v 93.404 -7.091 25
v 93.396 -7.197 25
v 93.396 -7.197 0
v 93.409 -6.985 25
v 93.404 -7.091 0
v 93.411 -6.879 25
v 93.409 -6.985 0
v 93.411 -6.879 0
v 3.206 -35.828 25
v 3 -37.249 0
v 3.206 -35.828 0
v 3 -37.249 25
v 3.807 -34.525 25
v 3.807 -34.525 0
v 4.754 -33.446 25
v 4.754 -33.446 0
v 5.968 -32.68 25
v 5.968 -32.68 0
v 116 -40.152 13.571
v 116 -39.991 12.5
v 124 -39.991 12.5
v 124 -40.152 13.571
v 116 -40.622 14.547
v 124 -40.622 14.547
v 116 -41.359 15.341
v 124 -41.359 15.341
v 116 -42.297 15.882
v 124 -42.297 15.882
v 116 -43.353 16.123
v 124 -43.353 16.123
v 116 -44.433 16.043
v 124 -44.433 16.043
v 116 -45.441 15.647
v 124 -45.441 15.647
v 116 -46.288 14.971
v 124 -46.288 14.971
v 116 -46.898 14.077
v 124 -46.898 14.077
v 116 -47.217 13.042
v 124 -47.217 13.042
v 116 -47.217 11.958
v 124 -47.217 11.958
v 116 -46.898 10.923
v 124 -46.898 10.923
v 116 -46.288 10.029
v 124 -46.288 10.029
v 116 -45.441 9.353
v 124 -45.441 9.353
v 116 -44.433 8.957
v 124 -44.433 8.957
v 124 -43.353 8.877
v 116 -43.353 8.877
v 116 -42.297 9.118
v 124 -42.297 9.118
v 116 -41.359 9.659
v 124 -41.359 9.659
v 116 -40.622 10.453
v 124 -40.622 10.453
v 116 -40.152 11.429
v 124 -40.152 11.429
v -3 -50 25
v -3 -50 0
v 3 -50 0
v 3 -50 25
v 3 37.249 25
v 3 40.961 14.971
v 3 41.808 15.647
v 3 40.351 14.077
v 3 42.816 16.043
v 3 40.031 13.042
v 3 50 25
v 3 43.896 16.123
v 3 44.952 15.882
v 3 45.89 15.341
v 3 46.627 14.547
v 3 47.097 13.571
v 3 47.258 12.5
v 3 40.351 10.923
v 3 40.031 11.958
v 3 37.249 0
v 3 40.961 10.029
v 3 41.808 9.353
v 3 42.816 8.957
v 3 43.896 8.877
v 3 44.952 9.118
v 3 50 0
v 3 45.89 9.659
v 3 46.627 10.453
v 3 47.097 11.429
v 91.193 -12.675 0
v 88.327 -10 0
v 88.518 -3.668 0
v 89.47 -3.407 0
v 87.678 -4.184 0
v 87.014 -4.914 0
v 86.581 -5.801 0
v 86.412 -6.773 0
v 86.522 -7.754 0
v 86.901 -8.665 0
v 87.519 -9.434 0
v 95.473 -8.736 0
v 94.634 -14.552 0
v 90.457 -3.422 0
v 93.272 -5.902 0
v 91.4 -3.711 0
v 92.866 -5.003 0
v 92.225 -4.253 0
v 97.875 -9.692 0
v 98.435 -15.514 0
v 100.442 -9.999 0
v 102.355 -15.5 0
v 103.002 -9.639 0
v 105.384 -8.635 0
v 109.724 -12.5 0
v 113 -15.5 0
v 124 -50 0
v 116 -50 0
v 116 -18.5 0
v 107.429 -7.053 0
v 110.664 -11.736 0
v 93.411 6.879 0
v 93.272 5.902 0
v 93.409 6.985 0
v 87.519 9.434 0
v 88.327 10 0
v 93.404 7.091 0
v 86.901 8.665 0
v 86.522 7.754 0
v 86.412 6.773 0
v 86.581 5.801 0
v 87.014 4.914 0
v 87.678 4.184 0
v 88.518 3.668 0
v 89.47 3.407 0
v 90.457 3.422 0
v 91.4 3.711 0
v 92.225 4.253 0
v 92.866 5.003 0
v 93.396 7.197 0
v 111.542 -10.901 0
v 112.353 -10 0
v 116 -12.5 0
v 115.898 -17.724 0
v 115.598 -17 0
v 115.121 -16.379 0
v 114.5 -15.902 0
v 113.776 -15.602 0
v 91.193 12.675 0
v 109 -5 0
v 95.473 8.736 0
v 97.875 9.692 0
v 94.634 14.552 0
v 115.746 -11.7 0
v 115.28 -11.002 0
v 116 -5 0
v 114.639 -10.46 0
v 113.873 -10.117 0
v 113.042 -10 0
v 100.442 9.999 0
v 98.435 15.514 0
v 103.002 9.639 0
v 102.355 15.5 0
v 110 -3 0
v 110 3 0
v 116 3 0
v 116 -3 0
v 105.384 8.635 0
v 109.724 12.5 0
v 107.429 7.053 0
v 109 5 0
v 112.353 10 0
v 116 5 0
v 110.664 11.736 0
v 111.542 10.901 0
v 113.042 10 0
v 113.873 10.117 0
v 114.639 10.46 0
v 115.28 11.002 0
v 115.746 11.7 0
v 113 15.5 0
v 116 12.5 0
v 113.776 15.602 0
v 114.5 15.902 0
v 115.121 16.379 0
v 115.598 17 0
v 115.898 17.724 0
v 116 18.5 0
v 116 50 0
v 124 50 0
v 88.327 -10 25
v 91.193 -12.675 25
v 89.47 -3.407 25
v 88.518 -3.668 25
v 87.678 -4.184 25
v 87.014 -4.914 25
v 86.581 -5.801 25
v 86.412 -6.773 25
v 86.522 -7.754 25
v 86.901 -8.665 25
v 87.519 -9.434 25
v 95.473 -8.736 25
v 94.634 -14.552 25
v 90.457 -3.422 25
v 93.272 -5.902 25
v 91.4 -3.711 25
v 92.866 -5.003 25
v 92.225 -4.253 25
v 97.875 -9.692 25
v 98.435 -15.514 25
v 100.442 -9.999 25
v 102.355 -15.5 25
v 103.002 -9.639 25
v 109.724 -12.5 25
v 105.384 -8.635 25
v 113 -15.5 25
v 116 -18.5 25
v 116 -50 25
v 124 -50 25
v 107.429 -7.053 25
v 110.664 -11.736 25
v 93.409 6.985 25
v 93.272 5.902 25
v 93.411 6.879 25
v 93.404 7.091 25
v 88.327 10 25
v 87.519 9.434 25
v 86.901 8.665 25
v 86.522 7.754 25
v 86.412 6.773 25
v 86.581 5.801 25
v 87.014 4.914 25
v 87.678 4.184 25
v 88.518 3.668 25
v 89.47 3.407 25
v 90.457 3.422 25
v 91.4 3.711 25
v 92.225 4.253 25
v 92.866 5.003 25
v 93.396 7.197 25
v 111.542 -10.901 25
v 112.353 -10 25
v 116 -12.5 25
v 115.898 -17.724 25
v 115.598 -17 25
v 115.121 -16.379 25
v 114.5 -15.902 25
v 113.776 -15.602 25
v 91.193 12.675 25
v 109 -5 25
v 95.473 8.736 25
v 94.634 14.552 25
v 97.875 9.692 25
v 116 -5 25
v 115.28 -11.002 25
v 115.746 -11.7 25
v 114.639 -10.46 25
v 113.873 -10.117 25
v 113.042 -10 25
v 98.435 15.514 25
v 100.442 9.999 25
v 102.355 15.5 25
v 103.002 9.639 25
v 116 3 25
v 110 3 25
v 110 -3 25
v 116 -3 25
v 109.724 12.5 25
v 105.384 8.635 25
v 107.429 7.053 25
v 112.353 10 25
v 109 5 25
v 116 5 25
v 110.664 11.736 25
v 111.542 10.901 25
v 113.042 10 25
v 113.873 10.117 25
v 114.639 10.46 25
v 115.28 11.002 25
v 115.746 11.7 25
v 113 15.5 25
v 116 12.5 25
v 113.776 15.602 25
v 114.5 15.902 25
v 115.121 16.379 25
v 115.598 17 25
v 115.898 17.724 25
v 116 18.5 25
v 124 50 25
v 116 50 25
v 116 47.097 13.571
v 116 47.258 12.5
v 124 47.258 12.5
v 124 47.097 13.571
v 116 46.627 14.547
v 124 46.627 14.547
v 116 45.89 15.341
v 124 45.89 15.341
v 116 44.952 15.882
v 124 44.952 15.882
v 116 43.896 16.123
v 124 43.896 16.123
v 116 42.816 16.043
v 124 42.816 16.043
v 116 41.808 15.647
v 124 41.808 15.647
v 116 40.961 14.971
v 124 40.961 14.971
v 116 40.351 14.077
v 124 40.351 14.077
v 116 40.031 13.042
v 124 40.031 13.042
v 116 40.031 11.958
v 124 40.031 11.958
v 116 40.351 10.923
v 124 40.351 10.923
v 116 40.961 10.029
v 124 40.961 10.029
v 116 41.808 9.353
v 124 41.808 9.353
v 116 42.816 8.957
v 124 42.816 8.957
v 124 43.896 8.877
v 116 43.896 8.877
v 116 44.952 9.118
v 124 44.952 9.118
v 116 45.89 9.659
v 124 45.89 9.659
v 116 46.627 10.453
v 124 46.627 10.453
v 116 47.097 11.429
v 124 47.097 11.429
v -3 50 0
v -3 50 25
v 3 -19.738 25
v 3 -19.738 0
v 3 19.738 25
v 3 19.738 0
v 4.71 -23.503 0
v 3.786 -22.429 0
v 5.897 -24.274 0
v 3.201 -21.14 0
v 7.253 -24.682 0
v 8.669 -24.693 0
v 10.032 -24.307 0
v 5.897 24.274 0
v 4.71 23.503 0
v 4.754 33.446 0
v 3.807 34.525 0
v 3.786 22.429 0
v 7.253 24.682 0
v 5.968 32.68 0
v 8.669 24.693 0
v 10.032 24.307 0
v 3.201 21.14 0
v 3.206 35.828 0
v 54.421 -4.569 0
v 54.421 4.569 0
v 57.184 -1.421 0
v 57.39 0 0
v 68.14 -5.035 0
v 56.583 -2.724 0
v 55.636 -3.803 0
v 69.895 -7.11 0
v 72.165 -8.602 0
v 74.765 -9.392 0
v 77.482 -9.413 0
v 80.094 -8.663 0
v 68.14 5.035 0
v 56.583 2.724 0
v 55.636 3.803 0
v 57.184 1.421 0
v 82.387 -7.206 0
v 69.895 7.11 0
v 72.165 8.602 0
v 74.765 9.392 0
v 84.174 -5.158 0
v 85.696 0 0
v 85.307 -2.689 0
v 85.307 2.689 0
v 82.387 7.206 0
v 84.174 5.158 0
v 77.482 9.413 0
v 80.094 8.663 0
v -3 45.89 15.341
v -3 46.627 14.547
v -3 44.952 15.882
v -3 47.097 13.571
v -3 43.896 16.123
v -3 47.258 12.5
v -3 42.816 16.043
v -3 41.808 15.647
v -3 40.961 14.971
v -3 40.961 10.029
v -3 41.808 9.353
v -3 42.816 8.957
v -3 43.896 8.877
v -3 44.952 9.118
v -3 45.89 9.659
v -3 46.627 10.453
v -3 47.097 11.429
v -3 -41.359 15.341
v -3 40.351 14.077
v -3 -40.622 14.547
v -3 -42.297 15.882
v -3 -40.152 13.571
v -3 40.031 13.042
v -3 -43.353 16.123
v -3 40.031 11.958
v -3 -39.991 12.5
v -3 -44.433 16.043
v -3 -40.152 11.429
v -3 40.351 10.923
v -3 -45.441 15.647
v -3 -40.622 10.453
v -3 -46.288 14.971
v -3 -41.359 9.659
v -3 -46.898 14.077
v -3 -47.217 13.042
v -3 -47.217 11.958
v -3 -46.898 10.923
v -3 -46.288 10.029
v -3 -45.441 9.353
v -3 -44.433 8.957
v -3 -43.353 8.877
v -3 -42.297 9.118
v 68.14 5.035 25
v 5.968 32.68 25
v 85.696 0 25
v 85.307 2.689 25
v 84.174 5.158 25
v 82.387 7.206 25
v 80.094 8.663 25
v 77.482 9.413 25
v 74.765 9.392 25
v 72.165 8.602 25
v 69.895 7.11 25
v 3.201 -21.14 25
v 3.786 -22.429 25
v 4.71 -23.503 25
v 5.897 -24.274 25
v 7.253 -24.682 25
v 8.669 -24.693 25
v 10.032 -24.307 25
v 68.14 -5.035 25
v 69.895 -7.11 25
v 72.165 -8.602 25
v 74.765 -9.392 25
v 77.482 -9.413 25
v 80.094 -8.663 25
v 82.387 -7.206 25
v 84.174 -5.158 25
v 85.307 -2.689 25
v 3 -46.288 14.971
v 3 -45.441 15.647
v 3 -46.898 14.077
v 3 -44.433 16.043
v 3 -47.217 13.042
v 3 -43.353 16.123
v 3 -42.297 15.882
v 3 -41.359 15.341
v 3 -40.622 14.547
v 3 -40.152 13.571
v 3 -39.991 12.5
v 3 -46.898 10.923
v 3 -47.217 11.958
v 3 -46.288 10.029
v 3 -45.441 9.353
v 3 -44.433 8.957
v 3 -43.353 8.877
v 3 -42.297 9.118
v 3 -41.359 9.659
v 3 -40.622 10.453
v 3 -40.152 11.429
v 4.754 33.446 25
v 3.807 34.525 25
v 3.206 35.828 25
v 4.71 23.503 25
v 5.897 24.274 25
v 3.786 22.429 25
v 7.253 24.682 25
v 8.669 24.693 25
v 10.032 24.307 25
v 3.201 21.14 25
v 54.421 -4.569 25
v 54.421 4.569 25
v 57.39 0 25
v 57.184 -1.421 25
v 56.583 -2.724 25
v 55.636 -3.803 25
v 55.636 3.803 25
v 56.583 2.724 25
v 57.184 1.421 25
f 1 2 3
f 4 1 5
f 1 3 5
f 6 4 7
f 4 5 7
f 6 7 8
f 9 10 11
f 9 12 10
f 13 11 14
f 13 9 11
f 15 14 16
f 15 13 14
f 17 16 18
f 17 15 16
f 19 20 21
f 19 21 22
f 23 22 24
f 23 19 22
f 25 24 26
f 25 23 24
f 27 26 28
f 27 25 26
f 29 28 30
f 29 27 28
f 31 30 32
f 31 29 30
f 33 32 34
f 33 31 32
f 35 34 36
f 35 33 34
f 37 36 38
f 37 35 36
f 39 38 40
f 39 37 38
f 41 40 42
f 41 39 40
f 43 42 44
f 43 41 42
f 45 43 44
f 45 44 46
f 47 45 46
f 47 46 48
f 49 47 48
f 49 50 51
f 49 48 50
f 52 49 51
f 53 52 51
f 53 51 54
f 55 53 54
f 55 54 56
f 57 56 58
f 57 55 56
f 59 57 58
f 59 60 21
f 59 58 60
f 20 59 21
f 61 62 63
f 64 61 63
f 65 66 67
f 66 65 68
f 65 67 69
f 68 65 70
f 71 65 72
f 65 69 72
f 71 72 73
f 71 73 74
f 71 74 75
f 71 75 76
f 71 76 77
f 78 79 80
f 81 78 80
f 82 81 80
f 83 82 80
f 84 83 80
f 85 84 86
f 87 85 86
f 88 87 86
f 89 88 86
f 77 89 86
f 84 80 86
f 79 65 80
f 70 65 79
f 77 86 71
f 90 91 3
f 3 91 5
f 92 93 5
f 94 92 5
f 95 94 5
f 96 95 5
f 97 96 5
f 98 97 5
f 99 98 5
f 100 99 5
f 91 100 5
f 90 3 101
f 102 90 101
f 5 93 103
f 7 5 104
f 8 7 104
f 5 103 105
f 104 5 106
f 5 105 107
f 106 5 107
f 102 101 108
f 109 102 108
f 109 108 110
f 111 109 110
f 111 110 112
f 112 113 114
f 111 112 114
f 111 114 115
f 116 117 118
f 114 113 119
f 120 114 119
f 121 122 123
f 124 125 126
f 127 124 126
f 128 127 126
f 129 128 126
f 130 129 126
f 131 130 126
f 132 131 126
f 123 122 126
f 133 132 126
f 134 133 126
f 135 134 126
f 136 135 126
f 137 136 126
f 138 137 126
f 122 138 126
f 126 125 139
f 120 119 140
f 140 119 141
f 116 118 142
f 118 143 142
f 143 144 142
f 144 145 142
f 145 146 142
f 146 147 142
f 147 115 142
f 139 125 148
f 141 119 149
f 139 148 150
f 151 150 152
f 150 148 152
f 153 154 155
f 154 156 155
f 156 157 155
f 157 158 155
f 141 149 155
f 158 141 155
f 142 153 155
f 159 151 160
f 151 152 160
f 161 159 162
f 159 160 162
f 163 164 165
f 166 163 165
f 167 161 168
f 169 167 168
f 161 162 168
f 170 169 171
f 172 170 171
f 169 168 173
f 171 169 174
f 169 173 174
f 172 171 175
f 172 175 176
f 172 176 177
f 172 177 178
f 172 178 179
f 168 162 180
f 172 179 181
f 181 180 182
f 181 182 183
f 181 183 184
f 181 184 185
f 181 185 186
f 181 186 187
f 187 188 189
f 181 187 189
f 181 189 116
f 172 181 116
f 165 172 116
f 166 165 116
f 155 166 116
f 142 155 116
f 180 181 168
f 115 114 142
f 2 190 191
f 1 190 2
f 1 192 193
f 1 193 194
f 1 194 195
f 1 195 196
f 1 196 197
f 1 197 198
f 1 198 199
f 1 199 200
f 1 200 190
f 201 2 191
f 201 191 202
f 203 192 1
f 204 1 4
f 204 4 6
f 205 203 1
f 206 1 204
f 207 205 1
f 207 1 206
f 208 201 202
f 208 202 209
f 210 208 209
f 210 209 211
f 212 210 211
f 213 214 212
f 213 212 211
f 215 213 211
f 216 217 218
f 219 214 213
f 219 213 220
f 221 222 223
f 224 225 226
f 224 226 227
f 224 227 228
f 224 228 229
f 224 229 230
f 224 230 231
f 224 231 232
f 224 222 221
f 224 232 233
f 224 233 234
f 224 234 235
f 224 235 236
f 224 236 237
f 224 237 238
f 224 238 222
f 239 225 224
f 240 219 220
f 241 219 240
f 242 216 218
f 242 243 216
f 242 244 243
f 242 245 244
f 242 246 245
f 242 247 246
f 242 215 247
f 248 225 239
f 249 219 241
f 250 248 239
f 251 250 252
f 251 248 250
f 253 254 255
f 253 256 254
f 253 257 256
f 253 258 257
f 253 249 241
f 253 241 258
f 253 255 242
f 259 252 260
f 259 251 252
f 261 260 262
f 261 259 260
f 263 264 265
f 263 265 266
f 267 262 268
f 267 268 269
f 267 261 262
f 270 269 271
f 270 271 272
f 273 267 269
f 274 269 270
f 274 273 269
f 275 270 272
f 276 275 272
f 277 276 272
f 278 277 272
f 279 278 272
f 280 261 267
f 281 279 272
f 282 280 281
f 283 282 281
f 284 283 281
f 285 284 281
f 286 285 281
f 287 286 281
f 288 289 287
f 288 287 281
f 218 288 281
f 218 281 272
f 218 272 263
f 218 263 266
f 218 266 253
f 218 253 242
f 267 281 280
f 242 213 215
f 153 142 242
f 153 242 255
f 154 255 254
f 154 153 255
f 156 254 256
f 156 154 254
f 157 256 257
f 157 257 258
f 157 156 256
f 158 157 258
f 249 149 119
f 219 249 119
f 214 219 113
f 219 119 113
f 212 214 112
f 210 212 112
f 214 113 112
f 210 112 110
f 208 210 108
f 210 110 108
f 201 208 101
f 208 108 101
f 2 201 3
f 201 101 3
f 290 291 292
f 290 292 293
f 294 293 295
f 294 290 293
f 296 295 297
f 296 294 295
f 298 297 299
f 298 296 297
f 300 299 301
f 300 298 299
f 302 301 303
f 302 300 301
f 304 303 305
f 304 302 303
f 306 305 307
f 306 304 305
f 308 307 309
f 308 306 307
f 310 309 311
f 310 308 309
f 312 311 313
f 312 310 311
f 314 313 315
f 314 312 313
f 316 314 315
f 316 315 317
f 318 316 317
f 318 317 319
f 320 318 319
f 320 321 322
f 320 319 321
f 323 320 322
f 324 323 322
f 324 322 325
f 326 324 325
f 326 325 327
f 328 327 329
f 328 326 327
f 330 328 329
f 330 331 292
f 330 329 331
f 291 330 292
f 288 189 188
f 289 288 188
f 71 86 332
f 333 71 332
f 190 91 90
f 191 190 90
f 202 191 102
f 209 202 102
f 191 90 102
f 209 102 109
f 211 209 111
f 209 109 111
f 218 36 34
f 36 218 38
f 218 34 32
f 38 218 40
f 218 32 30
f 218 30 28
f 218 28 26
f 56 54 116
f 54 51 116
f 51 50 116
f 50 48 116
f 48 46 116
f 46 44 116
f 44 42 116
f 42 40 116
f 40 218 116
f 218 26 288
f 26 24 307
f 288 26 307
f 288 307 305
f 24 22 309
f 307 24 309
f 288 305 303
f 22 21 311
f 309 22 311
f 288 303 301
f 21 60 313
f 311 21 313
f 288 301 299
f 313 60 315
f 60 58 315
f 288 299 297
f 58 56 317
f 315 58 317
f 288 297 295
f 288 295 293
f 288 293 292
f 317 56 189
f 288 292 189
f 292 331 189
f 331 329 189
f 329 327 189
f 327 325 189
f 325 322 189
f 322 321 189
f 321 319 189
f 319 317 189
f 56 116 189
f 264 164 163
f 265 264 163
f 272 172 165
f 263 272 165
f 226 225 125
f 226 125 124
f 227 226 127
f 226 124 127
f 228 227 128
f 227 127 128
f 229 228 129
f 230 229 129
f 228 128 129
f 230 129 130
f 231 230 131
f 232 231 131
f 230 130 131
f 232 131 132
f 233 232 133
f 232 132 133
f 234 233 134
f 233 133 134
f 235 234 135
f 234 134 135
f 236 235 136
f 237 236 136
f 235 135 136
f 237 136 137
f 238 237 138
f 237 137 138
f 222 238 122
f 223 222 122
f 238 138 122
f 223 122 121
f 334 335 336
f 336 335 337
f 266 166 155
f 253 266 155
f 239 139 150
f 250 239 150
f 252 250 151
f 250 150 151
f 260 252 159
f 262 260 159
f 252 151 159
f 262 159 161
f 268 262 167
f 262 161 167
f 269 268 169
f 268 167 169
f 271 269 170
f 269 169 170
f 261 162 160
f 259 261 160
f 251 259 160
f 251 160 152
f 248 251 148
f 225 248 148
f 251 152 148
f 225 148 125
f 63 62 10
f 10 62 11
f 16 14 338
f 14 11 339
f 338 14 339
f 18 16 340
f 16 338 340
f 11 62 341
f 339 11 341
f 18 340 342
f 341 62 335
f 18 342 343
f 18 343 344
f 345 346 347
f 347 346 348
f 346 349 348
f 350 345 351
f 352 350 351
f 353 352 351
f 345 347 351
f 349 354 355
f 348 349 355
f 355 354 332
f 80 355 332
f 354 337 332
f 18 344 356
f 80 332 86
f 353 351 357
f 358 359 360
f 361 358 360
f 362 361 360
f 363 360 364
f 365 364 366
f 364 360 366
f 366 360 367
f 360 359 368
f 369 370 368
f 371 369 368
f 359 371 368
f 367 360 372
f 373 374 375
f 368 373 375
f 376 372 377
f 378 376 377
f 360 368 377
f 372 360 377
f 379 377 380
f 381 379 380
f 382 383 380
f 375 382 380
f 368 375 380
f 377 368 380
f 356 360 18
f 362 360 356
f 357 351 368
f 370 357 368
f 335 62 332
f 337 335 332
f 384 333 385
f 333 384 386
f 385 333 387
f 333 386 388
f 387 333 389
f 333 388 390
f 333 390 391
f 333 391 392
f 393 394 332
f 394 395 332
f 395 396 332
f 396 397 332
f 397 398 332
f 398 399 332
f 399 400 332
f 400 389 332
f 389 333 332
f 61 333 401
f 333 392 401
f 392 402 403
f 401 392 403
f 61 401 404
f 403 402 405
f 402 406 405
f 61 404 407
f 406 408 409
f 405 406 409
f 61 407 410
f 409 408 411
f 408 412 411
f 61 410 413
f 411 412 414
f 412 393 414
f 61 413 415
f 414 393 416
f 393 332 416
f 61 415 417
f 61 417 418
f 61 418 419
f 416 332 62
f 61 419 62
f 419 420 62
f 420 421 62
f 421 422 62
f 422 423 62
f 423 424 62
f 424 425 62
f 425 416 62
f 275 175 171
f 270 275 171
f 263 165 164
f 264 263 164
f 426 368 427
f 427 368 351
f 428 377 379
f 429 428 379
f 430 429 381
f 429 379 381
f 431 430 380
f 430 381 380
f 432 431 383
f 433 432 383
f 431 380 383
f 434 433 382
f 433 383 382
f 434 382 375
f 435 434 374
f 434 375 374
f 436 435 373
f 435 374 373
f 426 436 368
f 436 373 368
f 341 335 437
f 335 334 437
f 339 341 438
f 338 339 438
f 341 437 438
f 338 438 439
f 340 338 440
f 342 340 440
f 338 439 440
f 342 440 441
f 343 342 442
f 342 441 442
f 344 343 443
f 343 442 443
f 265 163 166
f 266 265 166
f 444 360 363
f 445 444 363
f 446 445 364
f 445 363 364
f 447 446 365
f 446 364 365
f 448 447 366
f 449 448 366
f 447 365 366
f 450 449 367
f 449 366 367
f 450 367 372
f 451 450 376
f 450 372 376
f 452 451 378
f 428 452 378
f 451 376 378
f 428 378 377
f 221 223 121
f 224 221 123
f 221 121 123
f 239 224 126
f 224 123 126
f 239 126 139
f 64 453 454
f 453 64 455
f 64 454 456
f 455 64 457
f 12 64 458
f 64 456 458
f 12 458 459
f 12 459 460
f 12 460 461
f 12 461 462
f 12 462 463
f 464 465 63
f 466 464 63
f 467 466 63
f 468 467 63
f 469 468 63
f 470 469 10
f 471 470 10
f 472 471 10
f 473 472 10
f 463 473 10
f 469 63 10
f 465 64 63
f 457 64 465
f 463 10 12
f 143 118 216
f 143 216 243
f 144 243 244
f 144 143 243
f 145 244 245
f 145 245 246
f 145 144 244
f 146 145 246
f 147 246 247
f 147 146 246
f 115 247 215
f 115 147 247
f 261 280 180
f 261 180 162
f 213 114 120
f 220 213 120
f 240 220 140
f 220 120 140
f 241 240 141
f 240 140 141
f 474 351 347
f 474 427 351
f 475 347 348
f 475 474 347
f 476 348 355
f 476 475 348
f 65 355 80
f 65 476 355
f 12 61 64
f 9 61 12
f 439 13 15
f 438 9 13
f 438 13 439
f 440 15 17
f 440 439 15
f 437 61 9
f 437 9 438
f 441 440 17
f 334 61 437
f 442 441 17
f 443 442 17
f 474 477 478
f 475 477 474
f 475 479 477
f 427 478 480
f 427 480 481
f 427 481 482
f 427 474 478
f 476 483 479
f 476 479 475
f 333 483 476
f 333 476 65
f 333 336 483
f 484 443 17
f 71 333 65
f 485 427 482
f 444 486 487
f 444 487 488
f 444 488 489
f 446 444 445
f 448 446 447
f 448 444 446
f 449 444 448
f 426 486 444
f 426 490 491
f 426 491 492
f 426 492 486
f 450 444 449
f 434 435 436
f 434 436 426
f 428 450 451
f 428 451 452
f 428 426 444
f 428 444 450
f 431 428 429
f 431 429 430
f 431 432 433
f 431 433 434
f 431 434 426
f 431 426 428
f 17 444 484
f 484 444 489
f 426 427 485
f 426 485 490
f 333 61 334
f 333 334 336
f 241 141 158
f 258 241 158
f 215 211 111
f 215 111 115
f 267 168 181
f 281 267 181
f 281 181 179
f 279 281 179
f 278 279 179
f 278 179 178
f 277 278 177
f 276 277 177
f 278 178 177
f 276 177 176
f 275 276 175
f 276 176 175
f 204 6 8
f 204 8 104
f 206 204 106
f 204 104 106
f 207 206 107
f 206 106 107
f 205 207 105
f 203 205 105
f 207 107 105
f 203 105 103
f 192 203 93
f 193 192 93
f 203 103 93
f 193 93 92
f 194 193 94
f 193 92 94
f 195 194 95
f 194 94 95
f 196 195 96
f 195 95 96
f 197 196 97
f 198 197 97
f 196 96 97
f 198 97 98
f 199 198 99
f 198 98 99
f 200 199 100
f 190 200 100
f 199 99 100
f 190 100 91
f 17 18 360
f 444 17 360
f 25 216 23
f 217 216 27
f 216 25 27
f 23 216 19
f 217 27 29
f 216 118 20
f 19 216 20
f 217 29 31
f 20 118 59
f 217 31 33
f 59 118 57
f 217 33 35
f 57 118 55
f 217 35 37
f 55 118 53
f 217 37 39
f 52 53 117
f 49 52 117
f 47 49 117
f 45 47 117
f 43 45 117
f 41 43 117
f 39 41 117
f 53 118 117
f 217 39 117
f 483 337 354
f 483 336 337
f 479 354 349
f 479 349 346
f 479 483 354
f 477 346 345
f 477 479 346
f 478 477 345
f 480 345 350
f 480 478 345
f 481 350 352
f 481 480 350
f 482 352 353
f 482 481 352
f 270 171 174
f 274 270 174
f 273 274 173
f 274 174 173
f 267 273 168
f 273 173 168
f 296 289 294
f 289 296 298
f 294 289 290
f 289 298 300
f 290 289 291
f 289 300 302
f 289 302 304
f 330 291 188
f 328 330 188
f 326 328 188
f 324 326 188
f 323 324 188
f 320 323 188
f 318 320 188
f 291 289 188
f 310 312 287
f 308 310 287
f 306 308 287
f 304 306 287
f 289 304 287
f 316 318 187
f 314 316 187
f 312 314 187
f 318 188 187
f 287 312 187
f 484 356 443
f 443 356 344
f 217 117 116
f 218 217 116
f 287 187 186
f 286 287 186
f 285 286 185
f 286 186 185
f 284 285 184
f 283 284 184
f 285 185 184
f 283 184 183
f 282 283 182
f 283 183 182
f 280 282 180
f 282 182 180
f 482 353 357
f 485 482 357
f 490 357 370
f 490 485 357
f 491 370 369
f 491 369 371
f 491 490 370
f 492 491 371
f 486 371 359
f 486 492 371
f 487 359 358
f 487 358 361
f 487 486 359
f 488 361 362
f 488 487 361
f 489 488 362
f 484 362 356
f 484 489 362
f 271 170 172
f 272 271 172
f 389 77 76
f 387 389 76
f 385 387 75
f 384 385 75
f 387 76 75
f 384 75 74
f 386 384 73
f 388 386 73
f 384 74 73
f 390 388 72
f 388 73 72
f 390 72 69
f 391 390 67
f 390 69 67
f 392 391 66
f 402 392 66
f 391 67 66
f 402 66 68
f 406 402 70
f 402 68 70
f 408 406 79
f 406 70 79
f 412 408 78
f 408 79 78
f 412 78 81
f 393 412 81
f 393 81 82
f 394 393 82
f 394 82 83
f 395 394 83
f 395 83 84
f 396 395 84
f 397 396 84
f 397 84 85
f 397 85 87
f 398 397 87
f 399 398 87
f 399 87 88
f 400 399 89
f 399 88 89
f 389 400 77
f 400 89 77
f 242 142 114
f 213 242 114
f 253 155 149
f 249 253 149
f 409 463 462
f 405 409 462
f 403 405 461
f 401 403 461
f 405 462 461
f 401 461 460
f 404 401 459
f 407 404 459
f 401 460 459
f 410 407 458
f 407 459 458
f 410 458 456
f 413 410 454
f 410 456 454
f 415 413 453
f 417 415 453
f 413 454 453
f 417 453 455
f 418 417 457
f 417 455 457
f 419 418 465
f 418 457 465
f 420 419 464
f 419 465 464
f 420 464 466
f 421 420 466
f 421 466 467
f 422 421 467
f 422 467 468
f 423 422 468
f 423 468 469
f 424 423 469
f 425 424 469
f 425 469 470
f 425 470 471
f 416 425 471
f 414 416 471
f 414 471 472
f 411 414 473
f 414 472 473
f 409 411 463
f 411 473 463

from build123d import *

# Parameters (mm, degrees)
F1_DEPTH      = 25
F2_R          = 5
F5_DEPTH      = 25
F3_R          = 3.6336150251
F6_DEPTH      = 6
F6_DEPTH_BACK = 121.001
F7_T1_DEPTH   = 25


# Not quite as in the source:
# - a fillet or chamfer that OpenCascade refuses, or shapes differently, is made with other operations: its cross-section is extruded or revolved along the edge and cut away or added


with BuildPart() as f1:
    # F0 (on Top) → F1 (new body)
    with BuildSketch(Plane.XY):
        Polygon((3, 34), (3, 50), (-3, 50), (-3, -50), (3, -50), (3, -34), (3, -27.4335767708), (3, 27.4335767708), align=None)
        with BuildLine():
            Line((68.1400732815, 5.0350114336), (3, 34))
            Line((3, 34), (3, 27.4335767708))
            Line((3, 27.4335767708), (64.6960437298, 0))
            Line((64.6960437298, 0), (3, -27.4335767708))
            Line((3, -27.4335767708), (3, -34))
            Line((3, -34), (68.1400732815, -5.0350114336))
            ThreePointArc((68.1400732815, -5.0350114336), (66.6960437298, 0), (68.1400732815, 5.0350114336))
        make_face()
        with BuildLine():
            ThreePointArc((85.6960437298, 0), (78.8150397914, 9.1318595932), (68.1400732815, 5.0350114336))
            ThreePointArc((68.1400732815, 5.0350114336), (66.6960437298, 0), (68.1400732815, -5.0350114336))
            ThreePointArc((68.1400732815, -5.0350114336), (78.8150397914, -9.1318595932), (85.6960437298, 0))
        make_face()
    extrude(amount=F1_DEPTH)

    # F2
    f2_edges = [f1.edges().sort_by_distance(p)[0] for p in [
        (64.696044, 0, 12.5),
        (3, 27.433577, 12.5),
        (3, -27.433577, 12.5),
        (3, 34, 12.5),
        (3, -34, 12.5),
    ]]
    fillet(f2_edges, radius=F2_R)


with BuildPart() as f5:
    # F4 (on Top) → F5 (new body)
    with BuildSketch(Plane.XY):
        Polygon((124, -50), (124, 50), (116, 50), (116, 15.5), (116, 12.5), (116, 10), (116, 5), (116, 3), (116, -3), (116, -5), (116, -10), (116, -12.5), (116, -15.5), (116, -50), align=None)
        with BuildLine():
            Line((116, 12.5), (116, 15.5))
            Line((116, 15.5), (102.3548491623, 15.5))
            ThreePointArc((102.3548491623, 15.5), (106.233407666, 14.476718987), (109.7238090964, 12.5))
            Line((109.7238090964, 12.5), (116, 12.5))
        make_face()
        with BuildLine():
            ThreePointArc((109.7238090964, 12.5), (106.233407666, 14.476718987), (102.3548491623, 15.5))
            ThreePointArc((102.3548491623, 15.5), (94.6343391262, 14.551940549), (88.326809564, 10))
            ThreePointArc((88.326809564, 10), (91.6045970412, 9.9418299371), (93.3963954262, 7.1965188345))
            ThreePointArc((93.3963954262, 7.1965188345), (101.7337018999, 9.9023677393), (109, 5))
            Line((109, 5), (115.1488864135, 5))
            Line((115.1488864135, 5), (116, 5))
            Line((116, 5), (116, 10))
            Line((116, 10), (112.3526823604, 10))
            ThreePointArc((112.3526823604, 10), (111.1110224533, 11.3265283145), (109.7238090964, 12.5))
        make_face()
        with BuildLine():
            Line((102.3548491623, -15.5), (116, -15.5))
            Line((116, -15.5), (116, -12.5))
            Line((116, -12.5), (109.7238090964, -12.5))
            ThreePointArc((109.7238090964, -12.5), (106.233407666, -14.476718987), (102.3548491623, -15.5))
        make_face()
        with BuildLine():
            ThreePointArc((93.3963954262, 7.1965188345), (91.6045970412, 9.9418299371), (88.326809564, 10))
            ThreePointArc((88.326809564, 10), (88.0797216709, 3.8961721588), (93.4108312054, 6.8789624418))
            ThreePointArc((93.4108312054, 6.8789624418), (93.407220398, 7.0379046123), (93.3963954262, 7.1965188345))
        make_face()
        with BuildLine():
            ThreePointArc((88.326809564, -10), (94.6343391262, -14.551940549), (102.3548491623, -15.5))
            ThreePointArc((102.3548491623, -15.5), (106.233407666, -14.476718987), (109.7238090964, -12.5))
            ThreePointArc((109.7238090964, -12.5), (111.1110224533, -11.3265283145), (112.3526823604, -10))
            Line((112.3526823604, -10), (116, -10))
            Line((116, -10), (116, -5))
            Line((116, -5), (115.1488864135, -5))
            Line((115.1488864135, -5), (109, -5))
            ThreePointArc((109, -5), (101.7337018999, -9.9023677393), (93.3963954262, -7.1965188345))
            ThreePointArc((93.3963954262, -7.1965188345), (91.6045970412, -9.9418299371), (88.326809564, -10))
        make_face()
        with BuildLine():
            ThreePointArc((93.4108312054, -6.8789624418), (88.0797216709, -3.8961721588), (88.326809564, -10))
            ThreePointArc((88.326809564, -10), (91.6045970412, -9.9418299371), (93.3963954262, -7.1965188345))
            ThreePointArc((93.3963954262, -7.1965188345), (93.407220398, -7.0379046123), (93.4108312054, -6.8789624418))
        make_face()
        Polygon((116, -3), (116, 3), (110, 3), (110, 0), (110, -3), align=None)
    extrude(amount=F5_DEPTH)


with BuildPart() as f6_tool:
    # F3 (on face) → F6 (new body, two sides)
    with BuildSketch(Plane.YZ.offset(3)) as f6_sk:
        with Locations((-43.6243672171, 12.5)):
            Circle(F3_R)
        with Locations((43.6243672171, 12.5)):
            Circle(F3_R)
    extrude(amount=-F6_DEPTH)
    extrude(f6_sk.sketch, amount=F6_DEPTH_BACK)


with BuildPart() as f1_1:
    add(f1.part)

    # F6: cut by f6_tool
    add(f6_tool.part, mode=Mode.SUBTRACT)


with BuildPart() as f5_1:
    add(f5.part)

    # F6: cut by f6_tool
    add(f6_tool.part, mode=Mode.SUBTRACT)

    # F7: fillet of radius 3 on 4 edges, made by hand

    # F7_s2 → F7_t1 (join)
    with BuildSketch(Plane.XY):
        with BuildLine():
            ThreePointArc((116, 12.5), (114.9784517816, 10.7087121525), (113.0419601084, 10))
            Line((113.0419601084, 10), (116, 10))
            Line((116, 10), (116, 12.5))
        make_face()
        with BuildLine():
            ThreePointArc((116, -12.5), (114.9784517816, -10.7087121525), (113.0419601085, -10))
            Line((113.0419601085, -10), (116, -10))
            Line((116, -10), (116, -12.5))
        make_face()
        with BuildLine():
            ThreePointArc((116, -18.5), (115.1213203436, -16.3786796564), (113, -15.5))
            Line((113, -15.5), (116, -15.5))
            Line((116, -15.5), (116, -18.5))
        make_face()
        with BuildLine():
            ThreePointArc((116, 18.5), (115.1213203436, 16.3786796564), (113, 15.5))
            Line((113, 15.5), (116, 15.5))
            Line((116, 15.5), (116, 18.5))
        make_face()
    extrude(amount=F7_T1_DEPTH)


solid = Compound([f1_1.part, f5_1.part])
